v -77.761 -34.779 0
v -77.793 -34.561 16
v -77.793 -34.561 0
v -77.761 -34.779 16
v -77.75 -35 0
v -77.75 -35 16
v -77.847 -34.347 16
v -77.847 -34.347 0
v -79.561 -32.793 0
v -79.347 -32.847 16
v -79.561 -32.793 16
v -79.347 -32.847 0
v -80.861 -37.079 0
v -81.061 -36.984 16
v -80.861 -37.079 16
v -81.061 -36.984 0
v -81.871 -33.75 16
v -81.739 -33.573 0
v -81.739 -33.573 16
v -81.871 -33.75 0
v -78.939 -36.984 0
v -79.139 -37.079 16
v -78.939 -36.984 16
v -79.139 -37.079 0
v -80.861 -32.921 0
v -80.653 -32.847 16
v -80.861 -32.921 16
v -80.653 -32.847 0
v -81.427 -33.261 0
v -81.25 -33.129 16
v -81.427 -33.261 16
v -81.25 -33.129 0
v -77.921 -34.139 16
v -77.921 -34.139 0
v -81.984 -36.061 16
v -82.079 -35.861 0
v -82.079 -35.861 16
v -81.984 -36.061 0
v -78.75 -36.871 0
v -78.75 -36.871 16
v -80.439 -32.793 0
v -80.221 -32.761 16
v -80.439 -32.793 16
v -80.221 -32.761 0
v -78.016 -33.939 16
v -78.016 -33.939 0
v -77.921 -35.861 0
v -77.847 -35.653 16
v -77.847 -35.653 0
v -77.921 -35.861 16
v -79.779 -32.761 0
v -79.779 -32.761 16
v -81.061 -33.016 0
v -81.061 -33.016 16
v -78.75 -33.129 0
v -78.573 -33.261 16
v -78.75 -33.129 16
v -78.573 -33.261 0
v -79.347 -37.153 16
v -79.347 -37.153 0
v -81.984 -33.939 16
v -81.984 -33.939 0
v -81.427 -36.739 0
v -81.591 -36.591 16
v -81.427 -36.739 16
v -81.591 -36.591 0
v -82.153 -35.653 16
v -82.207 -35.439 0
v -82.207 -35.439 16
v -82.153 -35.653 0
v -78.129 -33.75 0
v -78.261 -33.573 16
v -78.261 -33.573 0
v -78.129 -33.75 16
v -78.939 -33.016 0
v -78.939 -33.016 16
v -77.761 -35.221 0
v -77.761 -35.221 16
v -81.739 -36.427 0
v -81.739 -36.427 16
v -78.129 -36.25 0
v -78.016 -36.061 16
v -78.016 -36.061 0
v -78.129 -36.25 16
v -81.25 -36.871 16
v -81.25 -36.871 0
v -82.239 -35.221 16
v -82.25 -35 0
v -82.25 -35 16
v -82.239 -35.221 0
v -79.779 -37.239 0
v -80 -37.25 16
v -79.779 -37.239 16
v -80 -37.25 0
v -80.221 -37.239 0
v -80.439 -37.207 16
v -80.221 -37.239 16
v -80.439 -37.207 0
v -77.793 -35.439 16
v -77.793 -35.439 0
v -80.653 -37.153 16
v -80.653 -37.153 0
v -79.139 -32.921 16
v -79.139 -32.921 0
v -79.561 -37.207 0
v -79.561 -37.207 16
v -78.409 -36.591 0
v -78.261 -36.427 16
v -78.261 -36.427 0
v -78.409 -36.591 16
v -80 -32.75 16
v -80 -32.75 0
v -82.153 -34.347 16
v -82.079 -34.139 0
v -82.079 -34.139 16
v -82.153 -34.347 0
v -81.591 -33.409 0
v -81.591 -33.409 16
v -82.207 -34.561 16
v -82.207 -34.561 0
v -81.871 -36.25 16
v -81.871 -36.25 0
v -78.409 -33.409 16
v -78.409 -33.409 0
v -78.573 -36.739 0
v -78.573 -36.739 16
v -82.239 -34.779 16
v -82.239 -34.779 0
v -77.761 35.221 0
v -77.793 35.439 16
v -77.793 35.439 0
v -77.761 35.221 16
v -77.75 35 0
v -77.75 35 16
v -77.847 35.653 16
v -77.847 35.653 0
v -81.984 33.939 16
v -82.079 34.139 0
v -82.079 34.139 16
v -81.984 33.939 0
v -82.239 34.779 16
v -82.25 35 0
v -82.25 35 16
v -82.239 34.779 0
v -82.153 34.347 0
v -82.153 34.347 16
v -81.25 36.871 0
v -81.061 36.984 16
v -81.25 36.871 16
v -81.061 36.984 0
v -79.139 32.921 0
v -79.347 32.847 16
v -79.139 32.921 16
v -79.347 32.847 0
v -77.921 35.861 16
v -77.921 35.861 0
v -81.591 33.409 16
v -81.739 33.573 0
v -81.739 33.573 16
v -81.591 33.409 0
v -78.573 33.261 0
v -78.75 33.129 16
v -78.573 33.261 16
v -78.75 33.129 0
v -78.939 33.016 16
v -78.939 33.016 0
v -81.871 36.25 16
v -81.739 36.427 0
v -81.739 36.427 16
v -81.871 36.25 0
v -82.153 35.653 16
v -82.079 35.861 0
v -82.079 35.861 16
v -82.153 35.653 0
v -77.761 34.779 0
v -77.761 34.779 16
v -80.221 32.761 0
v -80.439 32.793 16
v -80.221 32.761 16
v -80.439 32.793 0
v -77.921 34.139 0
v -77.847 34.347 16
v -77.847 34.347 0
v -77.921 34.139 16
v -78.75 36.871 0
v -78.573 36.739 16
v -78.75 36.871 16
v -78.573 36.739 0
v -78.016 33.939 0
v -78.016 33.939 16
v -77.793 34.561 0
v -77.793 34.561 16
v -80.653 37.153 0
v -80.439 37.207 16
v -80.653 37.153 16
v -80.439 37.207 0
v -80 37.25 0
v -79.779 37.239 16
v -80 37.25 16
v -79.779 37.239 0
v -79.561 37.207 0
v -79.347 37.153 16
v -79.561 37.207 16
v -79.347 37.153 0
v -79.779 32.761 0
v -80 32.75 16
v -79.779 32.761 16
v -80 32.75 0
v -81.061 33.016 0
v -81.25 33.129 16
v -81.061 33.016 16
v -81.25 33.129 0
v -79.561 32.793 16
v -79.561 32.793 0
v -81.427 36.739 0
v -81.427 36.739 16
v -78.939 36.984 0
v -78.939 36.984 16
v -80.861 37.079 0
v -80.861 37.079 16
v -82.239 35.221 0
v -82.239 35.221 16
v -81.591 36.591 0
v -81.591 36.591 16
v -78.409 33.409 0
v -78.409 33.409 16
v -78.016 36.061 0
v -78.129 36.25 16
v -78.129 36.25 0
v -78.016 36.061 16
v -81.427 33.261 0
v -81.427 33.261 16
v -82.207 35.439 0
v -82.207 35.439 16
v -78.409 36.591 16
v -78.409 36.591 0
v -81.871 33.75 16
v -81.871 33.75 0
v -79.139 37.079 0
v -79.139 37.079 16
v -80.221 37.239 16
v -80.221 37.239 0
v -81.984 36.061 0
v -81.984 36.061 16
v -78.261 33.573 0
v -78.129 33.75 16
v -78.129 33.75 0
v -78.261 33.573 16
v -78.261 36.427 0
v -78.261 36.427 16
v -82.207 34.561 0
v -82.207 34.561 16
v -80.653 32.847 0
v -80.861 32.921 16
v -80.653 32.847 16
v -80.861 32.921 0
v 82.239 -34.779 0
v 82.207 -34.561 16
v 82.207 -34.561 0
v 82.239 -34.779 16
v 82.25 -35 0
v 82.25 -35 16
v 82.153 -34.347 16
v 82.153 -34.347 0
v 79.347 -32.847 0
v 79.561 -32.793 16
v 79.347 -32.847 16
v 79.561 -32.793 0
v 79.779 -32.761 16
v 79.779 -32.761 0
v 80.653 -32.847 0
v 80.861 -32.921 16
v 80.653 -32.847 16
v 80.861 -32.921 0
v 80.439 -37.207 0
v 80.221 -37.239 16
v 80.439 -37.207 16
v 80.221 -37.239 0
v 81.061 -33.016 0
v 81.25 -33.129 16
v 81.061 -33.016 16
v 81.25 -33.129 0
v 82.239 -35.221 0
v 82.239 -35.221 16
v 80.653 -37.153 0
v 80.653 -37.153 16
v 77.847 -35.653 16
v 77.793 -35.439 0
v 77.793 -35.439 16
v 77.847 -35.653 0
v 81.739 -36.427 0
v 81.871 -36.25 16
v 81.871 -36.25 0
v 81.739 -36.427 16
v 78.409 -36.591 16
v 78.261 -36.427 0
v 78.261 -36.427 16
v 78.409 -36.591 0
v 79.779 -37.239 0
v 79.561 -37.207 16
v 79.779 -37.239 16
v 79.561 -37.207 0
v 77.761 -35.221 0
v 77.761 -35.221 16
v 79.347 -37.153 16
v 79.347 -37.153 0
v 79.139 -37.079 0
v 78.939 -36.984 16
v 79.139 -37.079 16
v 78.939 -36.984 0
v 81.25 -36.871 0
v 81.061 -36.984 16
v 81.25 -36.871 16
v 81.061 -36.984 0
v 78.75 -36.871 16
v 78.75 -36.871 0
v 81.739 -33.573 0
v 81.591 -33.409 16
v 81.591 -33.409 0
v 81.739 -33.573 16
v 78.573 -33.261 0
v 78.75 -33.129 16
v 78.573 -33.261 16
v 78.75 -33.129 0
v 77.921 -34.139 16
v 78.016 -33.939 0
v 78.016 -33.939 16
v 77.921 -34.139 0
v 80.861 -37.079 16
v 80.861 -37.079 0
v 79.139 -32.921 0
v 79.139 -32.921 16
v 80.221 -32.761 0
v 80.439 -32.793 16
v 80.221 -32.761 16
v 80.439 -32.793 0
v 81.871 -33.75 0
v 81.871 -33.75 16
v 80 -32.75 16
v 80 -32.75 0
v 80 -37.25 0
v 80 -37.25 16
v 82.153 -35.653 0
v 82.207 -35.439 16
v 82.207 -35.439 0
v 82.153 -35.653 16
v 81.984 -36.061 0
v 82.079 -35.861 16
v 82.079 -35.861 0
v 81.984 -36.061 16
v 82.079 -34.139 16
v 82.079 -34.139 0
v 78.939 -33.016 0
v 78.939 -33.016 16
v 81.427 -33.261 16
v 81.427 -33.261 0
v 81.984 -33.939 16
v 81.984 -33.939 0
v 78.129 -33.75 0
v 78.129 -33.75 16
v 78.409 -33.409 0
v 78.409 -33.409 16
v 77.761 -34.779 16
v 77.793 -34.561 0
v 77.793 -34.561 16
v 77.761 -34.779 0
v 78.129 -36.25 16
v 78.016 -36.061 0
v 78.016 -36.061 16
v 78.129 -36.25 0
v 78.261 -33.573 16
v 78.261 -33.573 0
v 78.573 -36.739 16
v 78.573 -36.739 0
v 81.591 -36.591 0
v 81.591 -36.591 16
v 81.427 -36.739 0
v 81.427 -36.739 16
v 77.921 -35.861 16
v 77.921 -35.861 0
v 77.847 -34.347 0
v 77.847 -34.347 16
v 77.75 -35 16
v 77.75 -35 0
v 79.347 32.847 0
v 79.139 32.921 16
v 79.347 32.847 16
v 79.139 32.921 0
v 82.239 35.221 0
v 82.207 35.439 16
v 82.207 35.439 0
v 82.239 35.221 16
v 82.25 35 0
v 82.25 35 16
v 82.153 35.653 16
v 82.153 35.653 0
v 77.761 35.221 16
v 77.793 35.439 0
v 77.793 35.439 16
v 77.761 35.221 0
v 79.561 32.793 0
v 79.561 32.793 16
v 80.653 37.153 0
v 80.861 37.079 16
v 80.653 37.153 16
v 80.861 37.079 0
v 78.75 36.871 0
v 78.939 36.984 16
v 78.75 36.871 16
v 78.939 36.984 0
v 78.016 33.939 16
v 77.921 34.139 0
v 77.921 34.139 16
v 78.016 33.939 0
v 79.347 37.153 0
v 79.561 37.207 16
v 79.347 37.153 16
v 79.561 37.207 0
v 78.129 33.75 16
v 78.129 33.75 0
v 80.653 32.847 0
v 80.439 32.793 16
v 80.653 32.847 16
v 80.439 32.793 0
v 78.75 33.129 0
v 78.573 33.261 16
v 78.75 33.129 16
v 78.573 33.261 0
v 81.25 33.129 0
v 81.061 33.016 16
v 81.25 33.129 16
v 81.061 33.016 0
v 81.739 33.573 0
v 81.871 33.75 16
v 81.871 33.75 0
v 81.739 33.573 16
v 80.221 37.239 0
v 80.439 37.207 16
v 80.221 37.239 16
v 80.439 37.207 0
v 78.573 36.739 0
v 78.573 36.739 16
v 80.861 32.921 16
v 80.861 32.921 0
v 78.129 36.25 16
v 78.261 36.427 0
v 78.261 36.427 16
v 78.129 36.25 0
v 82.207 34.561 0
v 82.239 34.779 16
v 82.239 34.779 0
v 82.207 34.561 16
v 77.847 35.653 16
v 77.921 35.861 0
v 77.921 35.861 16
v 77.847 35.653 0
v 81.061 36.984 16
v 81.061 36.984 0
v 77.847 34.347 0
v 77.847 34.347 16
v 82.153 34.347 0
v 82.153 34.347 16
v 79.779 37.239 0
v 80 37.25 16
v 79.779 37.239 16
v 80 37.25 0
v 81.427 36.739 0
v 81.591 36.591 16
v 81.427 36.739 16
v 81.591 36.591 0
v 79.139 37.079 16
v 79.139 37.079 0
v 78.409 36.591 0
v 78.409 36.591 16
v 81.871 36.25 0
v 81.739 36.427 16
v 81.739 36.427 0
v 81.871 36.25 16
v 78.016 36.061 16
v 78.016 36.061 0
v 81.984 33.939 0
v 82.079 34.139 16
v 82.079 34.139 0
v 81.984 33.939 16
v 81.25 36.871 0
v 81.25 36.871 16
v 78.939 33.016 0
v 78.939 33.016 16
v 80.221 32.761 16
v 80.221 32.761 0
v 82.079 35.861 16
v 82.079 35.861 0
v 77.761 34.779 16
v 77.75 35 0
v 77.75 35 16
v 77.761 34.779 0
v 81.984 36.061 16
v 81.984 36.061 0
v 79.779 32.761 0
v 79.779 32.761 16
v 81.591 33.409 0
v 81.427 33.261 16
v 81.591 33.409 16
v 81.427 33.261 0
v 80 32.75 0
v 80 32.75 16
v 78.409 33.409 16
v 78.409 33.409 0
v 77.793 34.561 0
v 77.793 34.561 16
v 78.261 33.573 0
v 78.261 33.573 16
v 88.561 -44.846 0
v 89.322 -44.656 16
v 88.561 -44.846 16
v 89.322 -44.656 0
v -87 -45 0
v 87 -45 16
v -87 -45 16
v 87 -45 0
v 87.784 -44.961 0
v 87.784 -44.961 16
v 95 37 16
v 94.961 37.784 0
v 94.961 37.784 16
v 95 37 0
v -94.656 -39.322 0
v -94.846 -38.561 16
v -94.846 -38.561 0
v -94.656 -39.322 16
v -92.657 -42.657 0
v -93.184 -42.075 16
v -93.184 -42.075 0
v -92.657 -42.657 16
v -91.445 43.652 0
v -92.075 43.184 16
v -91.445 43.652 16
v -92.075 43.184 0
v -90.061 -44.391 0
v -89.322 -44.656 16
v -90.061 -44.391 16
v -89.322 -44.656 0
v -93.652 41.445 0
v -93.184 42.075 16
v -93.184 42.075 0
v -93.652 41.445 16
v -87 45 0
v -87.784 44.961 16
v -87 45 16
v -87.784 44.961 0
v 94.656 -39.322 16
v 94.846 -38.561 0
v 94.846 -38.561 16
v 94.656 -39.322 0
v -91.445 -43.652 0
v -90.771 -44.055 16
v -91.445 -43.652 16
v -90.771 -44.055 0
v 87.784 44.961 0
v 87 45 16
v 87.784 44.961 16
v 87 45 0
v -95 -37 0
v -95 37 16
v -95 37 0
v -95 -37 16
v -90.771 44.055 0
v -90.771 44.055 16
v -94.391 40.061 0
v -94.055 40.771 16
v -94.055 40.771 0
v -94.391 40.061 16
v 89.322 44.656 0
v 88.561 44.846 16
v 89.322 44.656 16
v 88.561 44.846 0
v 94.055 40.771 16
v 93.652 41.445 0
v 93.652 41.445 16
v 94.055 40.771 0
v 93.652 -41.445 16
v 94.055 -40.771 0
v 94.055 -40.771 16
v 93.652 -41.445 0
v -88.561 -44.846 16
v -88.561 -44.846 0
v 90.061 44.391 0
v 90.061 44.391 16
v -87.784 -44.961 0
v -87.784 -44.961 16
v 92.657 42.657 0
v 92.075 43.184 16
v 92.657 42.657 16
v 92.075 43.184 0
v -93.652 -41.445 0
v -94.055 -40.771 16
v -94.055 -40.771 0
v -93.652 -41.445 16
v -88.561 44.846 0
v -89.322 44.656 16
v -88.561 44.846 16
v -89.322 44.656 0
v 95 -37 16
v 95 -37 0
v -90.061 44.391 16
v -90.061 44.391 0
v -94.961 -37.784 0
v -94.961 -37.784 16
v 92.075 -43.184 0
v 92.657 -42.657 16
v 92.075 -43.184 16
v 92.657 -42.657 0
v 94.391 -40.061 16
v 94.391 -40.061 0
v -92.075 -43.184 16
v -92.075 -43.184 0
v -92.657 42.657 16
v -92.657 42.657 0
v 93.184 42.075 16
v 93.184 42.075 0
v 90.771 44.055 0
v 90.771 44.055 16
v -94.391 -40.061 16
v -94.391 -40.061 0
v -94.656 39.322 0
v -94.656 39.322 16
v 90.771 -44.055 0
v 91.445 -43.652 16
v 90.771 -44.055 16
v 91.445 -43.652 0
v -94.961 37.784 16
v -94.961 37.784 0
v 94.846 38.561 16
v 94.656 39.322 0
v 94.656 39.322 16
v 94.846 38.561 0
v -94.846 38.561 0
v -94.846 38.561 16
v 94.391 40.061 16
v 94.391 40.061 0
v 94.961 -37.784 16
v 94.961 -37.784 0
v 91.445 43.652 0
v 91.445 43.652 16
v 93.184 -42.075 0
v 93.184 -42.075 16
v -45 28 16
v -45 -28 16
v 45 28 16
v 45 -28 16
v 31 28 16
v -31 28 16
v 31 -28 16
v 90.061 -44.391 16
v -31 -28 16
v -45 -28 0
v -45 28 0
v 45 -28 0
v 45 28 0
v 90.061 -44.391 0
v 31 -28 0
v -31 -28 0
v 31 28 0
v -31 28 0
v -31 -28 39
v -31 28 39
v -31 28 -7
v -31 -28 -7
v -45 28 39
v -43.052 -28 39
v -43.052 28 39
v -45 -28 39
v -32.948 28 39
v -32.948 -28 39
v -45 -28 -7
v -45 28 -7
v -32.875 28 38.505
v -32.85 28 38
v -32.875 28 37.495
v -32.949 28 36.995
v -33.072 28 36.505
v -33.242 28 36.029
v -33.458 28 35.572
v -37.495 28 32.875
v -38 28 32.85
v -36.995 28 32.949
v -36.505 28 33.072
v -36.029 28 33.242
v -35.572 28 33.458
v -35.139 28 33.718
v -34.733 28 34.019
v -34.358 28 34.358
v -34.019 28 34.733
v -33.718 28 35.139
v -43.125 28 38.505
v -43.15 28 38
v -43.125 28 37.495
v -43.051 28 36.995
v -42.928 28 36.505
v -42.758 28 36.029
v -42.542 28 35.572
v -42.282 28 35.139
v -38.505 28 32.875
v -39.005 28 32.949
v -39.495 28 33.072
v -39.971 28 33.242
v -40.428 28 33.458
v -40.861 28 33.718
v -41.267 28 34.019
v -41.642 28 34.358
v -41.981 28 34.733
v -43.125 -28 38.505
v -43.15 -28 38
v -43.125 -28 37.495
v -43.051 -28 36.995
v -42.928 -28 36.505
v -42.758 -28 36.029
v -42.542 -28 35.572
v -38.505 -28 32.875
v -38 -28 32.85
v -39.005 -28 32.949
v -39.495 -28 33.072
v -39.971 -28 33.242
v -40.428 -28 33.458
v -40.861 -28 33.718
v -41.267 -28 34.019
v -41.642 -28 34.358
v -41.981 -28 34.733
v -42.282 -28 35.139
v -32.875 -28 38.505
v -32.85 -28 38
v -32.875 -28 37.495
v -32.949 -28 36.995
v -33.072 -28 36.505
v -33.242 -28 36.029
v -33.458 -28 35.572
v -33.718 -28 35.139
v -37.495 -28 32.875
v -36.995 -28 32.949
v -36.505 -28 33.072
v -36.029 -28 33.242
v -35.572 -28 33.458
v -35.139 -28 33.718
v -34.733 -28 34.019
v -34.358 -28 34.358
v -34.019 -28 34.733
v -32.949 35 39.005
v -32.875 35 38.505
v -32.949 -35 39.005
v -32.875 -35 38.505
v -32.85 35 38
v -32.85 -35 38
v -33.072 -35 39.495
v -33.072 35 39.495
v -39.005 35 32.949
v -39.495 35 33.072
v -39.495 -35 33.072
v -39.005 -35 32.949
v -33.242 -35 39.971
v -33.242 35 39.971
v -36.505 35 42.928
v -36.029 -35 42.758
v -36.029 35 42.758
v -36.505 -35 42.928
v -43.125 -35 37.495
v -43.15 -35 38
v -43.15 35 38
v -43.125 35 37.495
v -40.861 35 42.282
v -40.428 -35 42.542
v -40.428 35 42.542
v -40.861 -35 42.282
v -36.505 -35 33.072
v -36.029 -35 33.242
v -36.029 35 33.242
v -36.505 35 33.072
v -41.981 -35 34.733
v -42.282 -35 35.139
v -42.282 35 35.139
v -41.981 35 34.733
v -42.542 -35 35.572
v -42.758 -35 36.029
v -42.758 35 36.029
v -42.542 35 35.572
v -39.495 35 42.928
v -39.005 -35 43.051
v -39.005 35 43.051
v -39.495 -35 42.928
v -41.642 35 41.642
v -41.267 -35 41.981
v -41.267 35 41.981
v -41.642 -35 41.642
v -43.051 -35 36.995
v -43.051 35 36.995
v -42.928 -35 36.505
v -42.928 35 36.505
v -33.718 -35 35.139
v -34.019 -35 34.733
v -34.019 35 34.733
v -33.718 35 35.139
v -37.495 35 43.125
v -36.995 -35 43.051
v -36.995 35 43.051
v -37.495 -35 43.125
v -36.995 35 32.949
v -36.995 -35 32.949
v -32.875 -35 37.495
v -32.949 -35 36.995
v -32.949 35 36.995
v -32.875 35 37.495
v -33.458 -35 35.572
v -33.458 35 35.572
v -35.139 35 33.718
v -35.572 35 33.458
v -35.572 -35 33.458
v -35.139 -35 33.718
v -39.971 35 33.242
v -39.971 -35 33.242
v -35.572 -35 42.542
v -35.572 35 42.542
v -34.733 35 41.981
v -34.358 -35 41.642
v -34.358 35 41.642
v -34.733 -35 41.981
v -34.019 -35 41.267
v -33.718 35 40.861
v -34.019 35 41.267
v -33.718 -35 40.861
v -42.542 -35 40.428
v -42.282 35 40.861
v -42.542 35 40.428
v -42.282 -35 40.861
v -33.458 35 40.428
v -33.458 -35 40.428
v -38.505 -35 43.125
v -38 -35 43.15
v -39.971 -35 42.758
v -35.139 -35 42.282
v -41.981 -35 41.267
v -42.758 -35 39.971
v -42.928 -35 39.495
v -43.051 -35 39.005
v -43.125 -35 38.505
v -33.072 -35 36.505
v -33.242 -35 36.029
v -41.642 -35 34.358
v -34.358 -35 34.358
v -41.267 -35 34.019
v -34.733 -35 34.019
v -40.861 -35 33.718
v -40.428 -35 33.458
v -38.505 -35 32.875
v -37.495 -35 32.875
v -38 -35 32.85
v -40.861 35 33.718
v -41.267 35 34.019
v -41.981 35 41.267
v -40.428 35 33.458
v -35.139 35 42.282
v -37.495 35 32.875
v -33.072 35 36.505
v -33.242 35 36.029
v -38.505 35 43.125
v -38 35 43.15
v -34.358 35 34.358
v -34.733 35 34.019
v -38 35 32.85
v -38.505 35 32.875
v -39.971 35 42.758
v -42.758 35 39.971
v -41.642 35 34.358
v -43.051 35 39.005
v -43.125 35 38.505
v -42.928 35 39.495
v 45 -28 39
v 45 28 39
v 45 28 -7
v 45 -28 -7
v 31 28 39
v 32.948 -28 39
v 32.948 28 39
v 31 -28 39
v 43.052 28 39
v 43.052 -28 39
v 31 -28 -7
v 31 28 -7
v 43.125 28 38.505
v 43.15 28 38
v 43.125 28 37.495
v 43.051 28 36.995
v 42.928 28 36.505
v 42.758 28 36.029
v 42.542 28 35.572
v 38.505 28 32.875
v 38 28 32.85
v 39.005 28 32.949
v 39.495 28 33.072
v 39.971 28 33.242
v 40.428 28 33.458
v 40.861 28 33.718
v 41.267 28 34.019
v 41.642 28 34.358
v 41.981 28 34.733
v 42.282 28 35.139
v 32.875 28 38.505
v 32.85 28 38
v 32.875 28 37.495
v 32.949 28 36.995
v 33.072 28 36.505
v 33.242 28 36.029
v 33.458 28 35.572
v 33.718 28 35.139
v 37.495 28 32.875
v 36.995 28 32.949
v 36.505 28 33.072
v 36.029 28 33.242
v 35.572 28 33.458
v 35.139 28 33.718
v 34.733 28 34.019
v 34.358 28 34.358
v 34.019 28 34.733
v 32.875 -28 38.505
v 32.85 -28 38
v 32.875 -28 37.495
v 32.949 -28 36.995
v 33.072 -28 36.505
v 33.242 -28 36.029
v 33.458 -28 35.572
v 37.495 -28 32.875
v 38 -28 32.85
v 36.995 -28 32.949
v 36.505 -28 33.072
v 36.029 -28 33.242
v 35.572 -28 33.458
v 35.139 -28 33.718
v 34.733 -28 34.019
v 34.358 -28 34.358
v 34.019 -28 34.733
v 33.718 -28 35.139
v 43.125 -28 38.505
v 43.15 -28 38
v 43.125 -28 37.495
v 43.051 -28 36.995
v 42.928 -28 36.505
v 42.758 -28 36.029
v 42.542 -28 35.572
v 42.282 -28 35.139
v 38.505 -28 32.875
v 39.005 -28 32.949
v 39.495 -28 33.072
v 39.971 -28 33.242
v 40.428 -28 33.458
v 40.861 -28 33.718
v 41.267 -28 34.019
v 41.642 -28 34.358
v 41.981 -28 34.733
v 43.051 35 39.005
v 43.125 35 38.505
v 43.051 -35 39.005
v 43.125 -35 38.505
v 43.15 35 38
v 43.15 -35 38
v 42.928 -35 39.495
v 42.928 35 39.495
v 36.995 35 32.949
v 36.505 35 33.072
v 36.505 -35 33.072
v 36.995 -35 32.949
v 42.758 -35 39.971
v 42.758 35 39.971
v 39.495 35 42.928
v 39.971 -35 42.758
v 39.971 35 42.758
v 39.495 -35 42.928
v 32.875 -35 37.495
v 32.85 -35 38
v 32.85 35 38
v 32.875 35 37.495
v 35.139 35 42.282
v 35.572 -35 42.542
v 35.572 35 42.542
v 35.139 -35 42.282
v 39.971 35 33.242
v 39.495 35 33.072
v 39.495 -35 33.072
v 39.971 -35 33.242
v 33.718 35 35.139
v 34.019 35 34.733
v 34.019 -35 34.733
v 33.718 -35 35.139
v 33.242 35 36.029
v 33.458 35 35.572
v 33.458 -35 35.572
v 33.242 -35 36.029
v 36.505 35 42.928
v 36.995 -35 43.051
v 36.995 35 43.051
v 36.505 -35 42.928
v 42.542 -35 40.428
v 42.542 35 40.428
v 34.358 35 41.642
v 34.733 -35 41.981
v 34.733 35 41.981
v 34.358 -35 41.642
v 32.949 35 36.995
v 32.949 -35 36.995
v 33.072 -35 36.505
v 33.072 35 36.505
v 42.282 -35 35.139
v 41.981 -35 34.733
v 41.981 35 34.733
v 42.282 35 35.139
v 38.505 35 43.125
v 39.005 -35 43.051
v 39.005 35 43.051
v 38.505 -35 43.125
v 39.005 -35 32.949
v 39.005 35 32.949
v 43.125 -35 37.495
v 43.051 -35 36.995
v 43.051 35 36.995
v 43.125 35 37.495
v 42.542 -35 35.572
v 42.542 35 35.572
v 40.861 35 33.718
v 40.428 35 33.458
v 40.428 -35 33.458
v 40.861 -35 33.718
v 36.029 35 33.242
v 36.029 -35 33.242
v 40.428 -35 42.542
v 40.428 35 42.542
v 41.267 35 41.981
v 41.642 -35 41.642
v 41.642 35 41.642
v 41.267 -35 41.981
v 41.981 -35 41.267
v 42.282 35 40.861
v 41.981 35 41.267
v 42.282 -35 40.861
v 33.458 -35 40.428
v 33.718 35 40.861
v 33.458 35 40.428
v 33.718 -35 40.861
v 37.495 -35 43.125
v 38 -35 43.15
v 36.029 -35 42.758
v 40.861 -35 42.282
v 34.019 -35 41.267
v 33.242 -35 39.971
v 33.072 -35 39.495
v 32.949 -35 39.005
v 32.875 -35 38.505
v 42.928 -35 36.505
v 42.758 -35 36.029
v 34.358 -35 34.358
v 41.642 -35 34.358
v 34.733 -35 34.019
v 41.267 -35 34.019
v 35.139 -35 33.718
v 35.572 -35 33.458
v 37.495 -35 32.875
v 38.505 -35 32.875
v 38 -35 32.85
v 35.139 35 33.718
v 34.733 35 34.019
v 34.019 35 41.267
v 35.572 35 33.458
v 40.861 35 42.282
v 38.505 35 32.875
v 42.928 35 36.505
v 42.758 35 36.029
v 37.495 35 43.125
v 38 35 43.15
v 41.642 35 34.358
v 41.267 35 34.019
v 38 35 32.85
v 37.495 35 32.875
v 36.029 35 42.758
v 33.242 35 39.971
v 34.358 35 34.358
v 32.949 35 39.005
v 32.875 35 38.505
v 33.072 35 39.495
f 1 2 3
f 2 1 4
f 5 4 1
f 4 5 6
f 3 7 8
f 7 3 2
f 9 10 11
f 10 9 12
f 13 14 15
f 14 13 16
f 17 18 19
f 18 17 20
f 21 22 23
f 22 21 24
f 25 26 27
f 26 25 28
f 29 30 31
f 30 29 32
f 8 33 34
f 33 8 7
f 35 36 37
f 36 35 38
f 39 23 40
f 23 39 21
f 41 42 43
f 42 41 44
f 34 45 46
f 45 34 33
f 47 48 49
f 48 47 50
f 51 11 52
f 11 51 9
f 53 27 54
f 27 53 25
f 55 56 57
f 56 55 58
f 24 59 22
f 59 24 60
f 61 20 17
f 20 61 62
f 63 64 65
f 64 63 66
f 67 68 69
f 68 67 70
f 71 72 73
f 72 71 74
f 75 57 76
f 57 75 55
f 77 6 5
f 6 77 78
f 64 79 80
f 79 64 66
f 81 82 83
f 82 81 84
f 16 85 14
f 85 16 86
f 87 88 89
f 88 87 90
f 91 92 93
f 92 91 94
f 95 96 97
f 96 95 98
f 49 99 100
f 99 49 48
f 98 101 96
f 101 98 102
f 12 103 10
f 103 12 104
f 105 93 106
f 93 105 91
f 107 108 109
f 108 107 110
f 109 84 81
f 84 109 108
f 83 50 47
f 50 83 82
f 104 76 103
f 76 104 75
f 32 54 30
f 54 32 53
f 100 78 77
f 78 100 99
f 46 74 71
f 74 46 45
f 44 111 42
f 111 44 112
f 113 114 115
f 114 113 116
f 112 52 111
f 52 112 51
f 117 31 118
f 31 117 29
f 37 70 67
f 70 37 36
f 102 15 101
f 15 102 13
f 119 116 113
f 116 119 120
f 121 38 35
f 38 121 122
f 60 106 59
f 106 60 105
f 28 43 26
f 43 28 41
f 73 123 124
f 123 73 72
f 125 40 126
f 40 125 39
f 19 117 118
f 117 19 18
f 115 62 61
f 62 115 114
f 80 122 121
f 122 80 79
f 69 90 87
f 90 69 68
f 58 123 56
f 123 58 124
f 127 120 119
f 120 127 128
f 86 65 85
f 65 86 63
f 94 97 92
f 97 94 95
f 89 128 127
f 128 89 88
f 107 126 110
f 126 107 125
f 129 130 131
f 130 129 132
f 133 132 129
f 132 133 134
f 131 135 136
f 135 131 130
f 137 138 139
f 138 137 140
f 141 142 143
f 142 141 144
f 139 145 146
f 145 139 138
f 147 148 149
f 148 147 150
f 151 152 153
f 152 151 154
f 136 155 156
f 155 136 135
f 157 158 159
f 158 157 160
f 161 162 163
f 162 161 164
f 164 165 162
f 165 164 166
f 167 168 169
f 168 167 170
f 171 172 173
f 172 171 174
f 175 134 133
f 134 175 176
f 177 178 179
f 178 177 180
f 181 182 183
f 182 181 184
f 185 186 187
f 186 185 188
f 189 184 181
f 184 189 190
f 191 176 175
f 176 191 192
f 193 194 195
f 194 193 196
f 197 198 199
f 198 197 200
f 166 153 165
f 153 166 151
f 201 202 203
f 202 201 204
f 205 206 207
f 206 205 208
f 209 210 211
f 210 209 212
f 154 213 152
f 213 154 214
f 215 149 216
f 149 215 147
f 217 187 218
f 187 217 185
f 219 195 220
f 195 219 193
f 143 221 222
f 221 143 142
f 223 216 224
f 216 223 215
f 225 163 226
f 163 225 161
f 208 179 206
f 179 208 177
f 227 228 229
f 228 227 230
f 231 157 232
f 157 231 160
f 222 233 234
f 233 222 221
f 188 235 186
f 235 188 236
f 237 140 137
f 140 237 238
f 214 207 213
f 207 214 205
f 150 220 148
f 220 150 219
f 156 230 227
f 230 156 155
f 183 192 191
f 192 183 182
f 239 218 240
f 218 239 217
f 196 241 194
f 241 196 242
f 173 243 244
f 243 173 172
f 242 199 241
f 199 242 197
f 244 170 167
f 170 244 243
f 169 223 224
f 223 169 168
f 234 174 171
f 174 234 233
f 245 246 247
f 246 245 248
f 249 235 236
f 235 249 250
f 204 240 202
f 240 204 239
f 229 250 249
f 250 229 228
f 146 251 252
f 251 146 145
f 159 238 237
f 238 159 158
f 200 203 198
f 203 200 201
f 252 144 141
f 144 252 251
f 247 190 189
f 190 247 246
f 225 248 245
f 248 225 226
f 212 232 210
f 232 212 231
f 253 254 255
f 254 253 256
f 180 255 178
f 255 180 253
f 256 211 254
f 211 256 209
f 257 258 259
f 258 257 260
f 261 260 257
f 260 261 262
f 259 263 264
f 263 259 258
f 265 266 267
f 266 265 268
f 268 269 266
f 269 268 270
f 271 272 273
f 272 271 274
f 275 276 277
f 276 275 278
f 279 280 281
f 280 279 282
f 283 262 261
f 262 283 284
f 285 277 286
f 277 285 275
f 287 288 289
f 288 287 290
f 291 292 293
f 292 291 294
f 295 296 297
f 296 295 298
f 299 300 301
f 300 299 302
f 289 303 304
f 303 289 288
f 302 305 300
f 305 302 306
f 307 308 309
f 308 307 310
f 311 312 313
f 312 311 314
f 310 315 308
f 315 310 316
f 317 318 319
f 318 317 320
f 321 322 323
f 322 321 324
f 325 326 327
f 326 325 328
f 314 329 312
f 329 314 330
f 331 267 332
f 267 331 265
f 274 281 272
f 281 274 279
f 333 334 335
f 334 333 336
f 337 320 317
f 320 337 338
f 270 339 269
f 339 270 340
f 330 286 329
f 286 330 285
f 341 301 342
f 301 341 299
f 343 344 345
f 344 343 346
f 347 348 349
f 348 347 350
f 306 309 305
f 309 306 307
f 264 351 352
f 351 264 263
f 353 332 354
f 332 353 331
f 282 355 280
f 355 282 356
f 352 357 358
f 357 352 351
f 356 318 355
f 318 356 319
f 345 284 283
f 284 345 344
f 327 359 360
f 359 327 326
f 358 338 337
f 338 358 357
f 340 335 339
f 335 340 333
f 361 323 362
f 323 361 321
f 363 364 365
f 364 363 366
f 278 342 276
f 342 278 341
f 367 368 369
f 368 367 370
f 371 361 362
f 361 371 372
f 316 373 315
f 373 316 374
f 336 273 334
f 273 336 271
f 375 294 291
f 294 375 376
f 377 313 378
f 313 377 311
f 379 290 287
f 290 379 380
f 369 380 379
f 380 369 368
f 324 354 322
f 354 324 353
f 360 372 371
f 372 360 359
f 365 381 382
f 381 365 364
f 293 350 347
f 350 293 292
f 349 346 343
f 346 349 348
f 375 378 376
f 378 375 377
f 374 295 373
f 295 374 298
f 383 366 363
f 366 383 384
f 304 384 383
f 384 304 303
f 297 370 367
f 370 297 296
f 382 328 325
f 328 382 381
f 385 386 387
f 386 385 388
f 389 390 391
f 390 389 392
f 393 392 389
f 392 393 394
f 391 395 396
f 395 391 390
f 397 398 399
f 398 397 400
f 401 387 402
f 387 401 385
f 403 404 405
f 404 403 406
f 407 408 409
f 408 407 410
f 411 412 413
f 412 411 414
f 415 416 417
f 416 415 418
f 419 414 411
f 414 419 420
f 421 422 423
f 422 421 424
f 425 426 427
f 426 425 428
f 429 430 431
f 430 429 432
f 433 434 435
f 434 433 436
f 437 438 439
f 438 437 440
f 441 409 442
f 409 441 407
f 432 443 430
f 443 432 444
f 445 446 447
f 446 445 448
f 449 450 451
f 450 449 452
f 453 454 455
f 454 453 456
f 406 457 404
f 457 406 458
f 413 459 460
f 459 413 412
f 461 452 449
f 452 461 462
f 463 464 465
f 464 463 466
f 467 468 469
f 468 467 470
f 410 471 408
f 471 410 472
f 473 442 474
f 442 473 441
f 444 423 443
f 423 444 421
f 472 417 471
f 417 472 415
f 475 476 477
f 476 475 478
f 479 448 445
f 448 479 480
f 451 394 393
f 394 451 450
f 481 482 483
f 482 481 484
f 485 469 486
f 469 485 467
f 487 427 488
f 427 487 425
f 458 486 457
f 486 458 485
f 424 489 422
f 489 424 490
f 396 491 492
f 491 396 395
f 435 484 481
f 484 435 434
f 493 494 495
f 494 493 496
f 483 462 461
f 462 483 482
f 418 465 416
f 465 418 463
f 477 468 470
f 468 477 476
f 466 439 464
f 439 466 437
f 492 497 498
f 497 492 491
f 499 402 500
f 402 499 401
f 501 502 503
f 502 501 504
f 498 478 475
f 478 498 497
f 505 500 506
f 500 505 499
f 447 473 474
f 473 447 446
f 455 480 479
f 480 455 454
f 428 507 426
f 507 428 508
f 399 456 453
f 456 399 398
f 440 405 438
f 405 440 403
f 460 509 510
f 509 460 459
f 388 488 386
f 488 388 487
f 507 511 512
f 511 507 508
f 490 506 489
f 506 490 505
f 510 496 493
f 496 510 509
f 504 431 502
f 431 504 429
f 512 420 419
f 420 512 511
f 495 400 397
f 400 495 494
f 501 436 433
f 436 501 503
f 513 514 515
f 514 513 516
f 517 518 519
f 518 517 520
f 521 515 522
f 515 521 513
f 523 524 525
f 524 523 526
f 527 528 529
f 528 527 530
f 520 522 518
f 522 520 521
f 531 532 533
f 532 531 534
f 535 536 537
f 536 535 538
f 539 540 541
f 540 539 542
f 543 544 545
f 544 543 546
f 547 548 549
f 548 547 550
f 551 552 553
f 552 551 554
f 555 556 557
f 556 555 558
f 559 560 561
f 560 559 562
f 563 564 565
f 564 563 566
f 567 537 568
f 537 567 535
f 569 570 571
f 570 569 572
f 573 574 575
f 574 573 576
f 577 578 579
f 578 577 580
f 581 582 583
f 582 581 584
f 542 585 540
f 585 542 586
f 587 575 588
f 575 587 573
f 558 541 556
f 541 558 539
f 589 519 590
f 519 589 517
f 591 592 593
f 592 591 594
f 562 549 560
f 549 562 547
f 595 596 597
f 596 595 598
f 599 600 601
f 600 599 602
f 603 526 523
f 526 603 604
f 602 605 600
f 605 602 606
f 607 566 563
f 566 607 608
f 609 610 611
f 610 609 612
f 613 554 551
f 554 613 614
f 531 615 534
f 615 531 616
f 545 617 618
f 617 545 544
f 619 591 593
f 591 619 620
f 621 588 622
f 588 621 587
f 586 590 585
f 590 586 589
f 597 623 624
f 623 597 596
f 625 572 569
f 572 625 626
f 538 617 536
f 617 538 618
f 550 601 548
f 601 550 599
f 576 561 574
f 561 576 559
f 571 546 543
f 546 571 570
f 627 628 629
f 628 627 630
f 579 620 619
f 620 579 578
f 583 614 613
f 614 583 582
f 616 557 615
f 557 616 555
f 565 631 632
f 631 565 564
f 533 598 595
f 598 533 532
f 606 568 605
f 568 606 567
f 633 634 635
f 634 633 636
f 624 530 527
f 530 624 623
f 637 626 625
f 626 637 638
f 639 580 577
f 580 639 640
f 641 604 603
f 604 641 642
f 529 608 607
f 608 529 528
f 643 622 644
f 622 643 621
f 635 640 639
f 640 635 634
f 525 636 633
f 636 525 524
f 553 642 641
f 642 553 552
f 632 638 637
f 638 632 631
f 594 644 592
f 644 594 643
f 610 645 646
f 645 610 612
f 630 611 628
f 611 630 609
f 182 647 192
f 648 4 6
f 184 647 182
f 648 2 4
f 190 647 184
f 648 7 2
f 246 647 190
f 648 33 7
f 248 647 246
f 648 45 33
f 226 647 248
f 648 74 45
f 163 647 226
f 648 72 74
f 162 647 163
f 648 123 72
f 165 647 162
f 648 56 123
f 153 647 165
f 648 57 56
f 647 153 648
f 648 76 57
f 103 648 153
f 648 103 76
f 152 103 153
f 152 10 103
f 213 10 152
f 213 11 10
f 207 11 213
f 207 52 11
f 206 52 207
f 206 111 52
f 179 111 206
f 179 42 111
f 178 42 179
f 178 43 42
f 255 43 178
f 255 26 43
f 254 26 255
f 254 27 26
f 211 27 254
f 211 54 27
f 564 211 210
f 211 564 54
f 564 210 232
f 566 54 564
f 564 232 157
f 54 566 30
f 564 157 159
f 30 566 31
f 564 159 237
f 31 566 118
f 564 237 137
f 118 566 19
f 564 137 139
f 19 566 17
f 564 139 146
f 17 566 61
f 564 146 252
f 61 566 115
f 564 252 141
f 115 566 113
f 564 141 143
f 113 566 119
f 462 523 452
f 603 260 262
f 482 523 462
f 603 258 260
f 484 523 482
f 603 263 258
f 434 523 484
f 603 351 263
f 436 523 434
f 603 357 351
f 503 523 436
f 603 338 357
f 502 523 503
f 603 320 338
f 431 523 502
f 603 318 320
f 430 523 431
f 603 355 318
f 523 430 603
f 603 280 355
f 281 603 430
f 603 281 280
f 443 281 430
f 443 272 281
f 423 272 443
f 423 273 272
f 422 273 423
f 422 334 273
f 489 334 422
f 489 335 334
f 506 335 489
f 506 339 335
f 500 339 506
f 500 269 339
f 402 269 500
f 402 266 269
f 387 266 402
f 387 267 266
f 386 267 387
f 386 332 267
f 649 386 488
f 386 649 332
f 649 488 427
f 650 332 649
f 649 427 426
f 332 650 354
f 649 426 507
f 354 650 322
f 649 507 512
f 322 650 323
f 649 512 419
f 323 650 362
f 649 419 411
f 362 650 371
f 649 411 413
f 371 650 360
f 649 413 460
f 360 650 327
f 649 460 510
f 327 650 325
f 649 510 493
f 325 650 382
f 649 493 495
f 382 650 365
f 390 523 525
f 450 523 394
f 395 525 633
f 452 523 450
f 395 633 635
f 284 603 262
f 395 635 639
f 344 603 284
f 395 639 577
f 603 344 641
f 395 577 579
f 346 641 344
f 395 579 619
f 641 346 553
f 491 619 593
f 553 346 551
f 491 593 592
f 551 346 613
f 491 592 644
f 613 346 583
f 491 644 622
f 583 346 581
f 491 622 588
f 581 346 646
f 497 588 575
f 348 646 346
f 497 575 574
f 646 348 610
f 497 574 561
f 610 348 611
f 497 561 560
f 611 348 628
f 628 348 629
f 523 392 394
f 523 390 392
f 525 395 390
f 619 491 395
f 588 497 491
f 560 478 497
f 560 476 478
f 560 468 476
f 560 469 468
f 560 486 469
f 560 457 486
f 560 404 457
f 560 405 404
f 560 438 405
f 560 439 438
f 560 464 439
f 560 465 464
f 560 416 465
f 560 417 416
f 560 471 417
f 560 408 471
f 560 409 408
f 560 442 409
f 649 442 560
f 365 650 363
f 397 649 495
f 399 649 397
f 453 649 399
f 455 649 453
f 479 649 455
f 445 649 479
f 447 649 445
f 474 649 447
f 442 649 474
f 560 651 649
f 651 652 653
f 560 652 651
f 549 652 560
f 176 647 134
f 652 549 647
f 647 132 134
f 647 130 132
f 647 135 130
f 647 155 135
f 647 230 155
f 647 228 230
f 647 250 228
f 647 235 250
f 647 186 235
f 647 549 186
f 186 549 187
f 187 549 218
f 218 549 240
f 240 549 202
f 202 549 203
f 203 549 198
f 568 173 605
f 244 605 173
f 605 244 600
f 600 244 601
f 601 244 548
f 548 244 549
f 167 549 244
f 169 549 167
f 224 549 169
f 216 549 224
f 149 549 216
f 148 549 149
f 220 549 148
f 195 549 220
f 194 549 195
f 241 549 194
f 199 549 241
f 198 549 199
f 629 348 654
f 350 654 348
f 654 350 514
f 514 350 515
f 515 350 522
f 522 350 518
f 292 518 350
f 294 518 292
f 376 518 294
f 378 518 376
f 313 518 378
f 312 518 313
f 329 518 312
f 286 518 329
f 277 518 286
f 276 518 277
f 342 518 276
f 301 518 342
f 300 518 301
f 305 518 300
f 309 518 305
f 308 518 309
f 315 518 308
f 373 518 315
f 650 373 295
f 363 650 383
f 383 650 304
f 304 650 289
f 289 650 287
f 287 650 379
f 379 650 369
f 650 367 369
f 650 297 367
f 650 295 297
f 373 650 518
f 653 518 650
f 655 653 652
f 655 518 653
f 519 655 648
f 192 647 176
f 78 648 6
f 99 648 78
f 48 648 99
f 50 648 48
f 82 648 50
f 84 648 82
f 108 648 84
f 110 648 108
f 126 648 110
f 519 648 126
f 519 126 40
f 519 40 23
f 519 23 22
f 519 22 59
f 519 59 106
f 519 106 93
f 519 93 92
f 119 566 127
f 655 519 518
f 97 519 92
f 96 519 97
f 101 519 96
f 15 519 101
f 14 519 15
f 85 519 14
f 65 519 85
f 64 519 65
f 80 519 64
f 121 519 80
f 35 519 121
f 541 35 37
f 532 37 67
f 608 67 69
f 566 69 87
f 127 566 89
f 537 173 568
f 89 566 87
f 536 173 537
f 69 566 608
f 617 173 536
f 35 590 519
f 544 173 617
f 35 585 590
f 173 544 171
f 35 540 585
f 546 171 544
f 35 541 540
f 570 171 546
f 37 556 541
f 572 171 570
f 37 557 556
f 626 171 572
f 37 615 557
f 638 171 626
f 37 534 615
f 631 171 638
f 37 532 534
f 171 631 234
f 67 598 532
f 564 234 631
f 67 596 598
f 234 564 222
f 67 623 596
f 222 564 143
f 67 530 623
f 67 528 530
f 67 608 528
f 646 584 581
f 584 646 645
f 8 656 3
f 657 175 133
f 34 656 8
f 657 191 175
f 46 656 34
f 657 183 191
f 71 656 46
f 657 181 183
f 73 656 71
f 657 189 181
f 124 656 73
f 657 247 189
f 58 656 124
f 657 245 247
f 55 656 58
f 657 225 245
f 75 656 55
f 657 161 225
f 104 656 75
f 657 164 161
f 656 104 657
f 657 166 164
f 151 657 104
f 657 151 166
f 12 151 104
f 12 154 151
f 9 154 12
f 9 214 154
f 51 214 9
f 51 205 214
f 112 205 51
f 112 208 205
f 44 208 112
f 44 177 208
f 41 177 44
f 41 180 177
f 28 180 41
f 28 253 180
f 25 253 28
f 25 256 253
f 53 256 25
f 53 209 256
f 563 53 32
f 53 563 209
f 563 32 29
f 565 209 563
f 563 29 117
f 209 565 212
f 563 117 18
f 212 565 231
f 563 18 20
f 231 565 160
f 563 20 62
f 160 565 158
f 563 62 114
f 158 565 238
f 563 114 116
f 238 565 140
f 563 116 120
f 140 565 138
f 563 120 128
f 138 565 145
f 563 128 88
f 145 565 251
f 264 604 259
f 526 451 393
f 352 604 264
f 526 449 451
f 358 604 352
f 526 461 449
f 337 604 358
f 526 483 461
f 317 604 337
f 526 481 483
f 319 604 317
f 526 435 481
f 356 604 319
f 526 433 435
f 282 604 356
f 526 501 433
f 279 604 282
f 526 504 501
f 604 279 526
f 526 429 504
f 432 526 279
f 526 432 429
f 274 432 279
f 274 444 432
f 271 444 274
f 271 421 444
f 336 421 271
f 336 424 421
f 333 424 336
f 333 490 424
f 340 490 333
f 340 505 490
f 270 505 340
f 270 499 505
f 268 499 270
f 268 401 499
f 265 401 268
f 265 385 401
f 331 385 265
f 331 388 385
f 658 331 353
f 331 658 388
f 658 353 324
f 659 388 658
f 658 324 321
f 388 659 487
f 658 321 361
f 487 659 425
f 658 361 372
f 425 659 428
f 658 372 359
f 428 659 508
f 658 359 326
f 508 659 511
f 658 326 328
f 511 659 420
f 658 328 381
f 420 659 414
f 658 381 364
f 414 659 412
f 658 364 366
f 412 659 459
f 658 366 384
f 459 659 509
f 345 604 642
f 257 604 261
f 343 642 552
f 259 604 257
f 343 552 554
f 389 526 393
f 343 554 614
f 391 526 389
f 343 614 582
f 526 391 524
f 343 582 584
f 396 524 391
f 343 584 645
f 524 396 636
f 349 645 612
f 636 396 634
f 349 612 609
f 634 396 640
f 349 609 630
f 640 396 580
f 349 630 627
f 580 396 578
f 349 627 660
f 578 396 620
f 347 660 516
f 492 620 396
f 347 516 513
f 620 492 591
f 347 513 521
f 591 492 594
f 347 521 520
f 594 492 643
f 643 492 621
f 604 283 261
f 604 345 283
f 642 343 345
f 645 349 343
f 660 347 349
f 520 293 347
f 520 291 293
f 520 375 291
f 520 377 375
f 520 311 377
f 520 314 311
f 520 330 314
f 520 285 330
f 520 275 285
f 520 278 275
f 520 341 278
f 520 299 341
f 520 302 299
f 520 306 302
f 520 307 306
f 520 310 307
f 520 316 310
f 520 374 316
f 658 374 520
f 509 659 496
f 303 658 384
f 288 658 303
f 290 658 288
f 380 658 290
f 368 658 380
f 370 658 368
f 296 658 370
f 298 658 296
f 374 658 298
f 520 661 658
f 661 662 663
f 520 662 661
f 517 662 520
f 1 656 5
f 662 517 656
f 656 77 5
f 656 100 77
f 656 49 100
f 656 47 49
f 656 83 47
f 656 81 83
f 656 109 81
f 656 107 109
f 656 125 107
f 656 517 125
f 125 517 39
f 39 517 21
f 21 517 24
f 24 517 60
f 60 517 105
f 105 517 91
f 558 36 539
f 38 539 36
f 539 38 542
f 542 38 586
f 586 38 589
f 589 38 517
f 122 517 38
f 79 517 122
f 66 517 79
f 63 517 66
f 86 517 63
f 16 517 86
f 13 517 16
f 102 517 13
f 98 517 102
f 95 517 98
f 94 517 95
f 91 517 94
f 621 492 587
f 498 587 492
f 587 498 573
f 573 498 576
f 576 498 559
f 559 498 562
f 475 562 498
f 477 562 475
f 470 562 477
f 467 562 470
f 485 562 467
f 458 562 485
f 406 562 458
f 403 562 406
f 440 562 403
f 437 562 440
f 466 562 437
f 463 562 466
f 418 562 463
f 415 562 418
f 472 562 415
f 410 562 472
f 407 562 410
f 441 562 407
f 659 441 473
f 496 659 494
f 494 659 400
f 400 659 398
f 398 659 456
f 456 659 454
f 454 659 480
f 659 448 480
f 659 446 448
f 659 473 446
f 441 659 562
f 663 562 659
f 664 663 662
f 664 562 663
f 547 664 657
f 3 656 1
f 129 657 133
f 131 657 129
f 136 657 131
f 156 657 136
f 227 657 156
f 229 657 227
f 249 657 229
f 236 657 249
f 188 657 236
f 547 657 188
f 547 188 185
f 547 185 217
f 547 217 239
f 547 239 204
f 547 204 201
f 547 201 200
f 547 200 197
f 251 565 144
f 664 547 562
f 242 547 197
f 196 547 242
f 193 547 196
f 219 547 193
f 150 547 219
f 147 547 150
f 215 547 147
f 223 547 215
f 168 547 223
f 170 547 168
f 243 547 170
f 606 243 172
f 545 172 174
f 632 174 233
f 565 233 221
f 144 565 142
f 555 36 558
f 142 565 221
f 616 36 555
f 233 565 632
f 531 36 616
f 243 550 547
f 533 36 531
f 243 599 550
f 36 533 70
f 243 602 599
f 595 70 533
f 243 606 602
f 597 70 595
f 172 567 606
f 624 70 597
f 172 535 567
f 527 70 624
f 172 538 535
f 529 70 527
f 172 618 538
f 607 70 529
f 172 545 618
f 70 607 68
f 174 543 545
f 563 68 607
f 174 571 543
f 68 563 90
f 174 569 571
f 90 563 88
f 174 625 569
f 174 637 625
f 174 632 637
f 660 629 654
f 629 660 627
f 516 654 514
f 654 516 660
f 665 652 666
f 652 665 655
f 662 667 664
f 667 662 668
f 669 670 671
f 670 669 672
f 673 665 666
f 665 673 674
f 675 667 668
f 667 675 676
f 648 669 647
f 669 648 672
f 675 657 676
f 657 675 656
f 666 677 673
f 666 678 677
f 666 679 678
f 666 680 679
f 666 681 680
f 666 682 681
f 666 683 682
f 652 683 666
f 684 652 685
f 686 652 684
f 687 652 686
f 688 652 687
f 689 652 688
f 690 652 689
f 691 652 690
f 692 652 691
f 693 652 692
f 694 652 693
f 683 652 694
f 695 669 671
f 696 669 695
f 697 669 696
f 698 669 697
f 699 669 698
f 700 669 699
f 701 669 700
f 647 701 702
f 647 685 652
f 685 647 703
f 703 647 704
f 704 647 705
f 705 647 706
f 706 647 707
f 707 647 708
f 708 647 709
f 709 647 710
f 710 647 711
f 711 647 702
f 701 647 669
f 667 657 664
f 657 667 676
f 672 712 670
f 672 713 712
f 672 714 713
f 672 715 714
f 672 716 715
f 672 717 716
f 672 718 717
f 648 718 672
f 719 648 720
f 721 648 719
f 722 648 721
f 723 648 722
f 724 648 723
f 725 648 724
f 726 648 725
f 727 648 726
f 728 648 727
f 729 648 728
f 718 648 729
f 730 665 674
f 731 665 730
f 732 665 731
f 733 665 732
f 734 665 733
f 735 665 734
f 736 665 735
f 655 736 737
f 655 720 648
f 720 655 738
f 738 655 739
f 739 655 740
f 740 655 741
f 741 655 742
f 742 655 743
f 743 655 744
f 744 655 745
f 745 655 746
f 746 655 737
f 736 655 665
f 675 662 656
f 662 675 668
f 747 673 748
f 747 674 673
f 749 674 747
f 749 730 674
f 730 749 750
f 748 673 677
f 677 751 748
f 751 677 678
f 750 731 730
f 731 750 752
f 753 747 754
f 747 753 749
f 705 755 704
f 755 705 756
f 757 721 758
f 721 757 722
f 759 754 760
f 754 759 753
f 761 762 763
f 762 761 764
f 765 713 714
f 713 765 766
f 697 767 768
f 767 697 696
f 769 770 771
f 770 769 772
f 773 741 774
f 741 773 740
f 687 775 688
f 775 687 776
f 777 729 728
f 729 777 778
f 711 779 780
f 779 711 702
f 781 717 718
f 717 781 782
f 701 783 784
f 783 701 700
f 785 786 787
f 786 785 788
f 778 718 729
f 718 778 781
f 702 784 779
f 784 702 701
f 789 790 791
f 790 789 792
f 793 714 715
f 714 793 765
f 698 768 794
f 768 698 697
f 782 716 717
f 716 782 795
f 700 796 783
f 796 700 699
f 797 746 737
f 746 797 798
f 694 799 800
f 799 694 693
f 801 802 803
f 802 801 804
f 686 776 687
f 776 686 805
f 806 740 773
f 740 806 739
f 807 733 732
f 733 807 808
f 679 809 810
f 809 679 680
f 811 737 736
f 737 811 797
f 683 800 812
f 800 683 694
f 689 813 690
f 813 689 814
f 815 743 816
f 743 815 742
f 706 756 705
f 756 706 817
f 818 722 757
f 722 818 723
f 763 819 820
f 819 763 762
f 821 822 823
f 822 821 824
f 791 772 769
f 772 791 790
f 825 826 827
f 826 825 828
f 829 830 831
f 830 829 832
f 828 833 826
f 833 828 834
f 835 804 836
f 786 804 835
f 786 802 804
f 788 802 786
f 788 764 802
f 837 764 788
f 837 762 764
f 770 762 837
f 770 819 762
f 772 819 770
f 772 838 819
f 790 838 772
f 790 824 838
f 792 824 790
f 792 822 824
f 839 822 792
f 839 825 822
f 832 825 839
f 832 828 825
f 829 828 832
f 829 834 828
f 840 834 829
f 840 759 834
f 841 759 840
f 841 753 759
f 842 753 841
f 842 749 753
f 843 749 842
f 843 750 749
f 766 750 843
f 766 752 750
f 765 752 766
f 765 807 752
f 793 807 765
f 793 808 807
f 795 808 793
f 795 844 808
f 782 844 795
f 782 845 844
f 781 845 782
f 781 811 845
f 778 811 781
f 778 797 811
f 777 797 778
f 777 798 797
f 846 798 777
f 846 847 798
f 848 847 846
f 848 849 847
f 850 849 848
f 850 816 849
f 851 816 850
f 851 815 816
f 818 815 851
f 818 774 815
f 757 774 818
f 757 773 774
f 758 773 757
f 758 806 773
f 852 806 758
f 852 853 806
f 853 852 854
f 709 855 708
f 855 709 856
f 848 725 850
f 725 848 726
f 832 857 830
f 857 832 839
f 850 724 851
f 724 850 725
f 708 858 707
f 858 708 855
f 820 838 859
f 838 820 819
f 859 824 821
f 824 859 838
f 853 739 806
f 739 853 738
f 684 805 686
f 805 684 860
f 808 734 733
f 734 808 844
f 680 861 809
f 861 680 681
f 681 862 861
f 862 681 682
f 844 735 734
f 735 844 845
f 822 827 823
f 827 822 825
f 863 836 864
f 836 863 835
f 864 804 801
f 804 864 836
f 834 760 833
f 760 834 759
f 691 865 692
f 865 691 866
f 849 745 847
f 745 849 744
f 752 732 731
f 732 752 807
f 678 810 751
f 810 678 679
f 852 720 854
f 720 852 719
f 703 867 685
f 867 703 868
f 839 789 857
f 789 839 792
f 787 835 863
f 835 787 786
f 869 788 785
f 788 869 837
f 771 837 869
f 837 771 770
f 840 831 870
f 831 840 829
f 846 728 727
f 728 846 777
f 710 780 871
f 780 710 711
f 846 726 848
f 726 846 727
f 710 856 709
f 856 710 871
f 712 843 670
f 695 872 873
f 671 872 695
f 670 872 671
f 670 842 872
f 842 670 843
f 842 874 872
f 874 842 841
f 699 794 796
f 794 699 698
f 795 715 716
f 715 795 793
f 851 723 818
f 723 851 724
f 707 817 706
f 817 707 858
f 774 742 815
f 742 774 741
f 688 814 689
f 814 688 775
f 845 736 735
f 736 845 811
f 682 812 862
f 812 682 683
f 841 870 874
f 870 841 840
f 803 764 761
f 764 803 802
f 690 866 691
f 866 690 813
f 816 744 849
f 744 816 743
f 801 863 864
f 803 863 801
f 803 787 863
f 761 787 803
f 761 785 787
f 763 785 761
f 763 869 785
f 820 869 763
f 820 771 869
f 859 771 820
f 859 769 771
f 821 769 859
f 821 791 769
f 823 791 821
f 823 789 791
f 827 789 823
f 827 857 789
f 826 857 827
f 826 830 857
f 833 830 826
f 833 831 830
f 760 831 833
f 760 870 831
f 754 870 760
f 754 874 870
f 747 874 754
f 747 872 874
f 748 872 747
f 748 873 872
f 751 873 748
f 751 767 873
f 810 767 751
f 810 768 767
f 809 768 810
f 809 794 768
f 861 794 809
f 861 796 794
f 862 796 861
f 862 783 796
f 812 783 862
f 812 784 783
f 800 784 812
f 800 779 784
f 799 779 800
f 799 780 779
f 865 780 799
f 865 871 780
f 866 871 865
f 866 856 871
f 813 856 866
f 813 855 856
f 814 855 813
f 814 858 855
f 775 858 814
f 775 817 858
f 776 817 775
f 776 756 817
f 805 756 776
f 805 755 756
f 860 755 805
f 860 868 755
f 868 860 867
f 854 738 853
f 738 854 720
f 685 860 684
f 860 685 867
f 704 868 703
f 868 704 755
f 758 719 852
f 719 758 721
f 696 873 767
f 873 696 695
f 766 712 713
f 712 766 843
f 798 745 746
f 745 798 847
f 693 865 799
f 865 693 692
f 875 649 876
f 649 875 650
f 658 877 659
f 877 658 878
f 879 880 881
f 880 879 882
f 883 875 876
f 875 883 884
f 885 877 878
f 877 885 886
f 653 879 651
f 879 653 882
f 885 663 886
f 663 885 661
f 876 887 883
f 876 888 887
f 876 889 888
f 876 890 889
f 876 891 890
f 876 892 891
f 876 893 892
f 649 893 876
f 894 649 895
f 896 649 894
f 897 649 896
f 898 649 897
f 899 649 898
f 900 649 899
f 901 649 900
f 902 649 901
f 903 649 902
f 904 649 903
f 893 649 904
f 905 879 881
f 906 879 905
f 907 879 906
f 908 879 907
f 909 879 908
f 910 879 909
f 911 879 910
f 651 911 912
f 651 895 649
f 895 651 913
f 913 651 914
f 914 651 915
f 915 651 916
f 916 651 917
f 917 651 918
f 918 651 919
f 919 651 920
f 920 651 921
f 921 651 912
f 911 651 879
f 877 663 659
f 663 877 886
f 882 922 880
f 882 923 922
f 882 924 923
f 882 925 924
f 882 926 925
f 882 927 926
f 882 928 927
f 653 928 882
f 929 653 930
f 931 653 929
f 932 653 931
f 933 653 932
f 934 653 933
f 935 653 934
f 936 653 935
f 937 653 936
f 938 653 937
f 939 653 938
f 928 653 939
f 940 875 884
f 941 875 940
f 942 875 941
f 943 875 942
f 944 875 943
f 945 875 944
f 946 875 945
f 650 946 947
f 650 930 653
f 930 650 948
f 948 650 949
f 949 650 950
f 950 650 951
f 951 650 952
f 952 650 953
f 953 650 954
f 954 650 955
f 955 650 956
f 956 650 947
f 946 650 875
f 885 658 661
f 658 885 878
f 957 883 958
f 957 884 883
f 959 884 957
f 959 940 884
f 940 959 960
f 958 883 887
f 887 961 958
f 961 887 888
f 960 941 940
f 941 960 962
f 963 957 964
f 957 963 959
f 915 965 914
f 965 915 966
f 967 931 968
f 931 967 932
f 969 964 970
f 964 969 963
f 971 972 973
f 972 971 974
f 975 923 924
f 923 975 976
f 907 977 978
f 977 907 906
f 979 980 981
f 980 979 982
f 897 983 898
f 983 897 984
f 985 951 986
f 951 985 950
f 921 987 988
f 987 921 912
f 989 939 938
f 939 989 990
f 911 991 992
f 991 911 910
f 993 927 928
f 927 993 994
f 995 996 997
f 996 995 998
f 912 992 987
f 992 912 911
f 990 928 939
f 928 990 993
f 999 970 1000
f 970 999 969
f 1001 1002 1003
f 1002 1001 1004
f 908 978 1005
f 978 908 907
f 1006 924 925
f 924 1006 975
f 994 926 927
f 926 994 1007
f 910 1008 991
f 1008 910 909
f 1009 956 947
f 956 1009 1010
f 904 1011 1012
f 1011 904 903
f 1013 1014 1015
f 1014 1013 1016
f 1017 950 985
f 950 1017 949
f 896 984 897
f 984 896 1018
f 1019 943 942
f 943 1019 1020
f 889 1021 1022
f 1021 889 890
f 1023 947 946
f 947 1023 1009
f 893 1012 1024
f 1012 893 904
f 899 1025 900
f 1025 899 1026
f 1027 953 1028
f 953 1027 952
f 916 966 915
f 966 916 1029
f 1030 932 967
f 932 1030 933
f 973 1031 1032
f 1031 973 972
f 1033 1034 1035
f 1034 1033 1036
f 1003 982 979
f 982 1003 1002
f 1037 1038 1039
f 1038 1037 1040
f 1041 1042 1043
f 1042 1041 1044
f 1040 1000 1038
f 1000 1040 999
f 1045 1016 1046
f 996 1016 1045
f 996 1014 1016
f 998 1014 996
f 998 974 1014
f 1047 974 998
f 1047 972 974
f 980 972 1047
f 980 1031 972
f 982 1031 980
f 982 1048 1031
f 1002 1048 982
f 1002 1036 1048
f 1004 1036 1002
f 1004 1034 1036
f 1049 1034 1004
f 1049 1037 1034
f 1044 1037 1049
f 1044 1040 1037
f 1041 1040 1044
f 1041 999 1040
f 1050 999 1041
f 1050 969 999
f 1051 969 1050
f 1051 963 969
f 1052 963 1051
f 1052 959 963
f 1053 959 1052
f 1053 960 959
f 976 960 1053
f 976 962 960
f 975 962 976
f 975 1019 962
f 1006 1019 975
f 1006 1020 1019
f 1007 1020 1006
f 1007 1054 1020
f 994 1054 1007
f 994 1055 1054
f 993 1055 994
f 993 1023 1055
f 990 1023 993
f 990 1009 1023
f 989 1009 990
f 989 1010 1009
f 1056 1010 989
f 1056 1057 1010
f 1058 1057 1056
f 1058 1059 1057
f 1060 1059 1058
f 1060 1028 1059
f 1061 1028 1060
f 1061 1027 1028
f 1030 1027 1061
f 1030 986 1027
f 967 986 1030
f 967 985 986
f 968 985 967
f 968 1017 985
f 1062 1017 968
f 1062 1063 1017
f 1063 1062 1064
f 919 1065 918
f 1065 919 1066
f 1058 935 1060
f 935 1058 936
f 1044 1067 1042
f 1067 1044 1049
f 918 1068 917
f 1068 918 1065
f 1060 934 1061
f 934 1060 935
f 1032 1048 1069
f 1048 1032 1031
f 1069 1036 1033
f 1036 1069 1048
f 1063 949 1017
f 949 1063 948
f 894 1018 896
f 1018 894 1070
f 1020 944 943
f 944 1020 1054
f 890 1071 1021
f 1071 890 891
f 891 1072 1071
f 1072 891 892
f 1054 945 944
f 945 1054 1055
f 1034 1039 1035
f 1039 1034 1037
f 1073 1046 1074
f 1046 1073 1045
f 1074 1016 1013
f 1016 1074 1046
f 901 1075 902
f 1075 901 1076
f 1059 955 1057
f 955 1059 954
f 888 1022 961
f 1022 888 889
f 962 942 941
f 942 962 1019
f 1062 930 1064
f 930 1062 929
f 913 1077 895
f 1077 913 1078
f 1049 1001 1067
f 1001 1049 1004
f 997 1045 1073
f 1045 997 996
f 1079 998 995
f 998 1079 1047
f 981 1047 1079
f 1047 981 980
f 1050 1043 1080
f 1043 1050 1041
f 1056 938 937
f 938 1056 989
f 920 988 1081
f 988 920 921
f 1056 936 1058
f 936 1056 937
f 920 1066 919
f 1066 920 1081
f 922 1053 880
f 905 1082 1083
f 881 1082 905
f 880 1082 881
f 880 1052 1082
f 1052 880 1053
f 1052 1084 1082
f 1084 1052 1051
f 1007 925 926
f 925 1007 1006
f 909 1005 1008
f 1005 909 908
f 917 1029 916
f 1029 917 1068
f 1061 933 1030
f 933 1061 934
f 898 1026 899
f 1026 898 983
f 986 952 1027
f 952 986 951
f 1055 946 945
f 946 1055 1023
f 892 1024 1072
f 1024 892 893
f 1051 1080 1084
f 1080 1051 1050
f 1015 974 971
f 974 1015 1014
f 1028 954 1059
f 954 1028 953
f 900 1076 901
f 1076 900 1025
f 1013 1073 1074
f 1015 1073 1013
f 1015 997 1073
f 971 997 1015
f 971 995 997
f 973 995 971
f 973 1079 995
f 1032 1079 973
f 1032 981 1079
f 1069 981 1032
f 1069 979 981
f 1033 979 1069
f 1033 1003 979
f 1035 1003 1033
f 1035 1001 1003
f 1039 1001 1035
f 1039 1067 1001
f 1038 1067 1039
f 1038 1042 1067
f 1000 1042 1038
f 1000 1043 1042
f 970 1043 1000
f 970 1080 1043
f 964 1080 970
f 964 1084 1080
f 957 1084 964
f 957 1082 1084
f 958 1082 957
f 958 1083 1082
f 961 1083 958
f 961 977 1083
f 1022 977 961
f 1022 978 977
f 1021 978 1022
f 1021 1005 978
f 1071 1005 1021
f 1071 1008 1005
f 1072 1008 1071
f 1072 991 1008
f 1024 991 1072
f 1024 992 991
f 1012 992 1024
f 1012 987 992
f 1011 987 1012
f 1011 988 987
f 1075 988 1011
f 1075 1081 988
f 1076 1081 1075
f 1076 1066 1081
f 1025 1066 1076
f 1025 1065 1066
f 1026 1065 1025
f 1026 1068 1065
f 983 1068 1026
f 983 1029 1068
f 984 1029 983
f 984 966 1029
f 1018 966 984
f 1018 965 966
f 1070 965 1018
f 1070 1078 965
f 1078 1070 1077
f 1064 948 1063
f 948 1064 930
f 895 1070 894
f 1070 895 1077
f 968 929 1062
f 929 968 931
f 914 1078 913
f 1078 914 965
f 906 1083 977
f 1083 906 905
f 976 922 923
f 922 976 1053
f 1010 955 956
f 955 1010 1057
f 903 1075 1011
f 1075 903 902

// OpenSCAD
// file: ../../common.scad
$fn=64;
module rounded_box2d(x,y,r=4){ offset(r=r) offset(delta=-r) square([x,y],center=true); }
module plate(x,y,h,r=4){ linear_extrude(h) rounded_box2d(x,y,r); }
module slot3d(len,d,h){ hull(){translate([-len/2,0,0])cylinder(h=h,d=d,center=true);translate([len/2,0,0])cylinder(h=h,d=d,center=true);} }
// main file
include <../../common.scad>
x=190;y=90;h=16;m4=4.5;shaft=10.3;
difference(){plate(x,y,h,8);for(xx=[-80,80])for(yy=[-35,35])translate([xx,yy,-1])cylinder(h=h+2,d=m4);}
for(xx=[-38,38]){translate([xx,0,h])cube([14,56,46],center=true);translate([xx,0,h+22])rotate([90,0,0])cylinder(h=70,d=shaft,center=true);}
